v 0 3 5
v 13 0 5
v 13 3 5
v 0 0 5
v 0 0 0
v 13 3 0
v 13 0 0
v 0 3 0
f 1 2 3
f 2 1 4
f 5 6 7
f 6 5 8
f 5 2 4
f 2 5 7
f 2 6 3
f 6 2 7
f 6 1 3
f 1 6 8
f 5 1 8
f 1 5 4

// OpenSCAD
// Generated by SolidPython 1.0.1 on 2020-07-29 00:46:55


cube(size = [13, 3, 5]);
/***********************************************
*********      SolidPython code:      **********
************************************************
 
# import packages: SolidPython
from solid import *
from solid.utils import *
from itertools import chain, combinations, permutations


class Resize:

    def __init__(self, scad_file):
        self.scad_file = scad_file
        #self.scad_file = import_scad(scad_file)
        # cone/cylinder param:
        self.r1 = 0
        self.r2 = 0
        self.h = 0
        # rectangular prism param:
        self.w = 0
        self.l = 0
        # ellipse param:
        self.r = 0

    # import OpenScad code (file name corresponds to shape)


    # classify shape + parameters
    def assign(self, param1, param2, param3):
        if self.scad_file == 'cone.scad':
            self.r1 = param1
            self.r2 = param2
            self.h = param3
        elif self.scad_file == 'cylinder.scad':
            self.r1 = param1
            self.r2 = param2
            self.h = param3
        elif self.scad_file == 'rectangularPrism.scad':
            self.h = param1
            self.l = param2
            self.w = param3
        else:
            self.r = param1
            self.h = param2

    # resize parameters
    def iterate(self):
        x = range(3, 20, 2)
        i = 1
        if self.scad_file == 'cone.scad':
            tempList = list(permutations(x, 2))
            for temp in tempList:
                param1 = temp[0]
                param2 = temp[1]
                filepath = 'produced_scad_files/' + 'cone' + str(param1) + '_' + str(param2) + '_' + '.scad'
                scad_render_to_file(cylinder(h=param1, r1=param2, r2=0), filepath)

        elif self.scad_file == 'cylinder.scad':
            tempList = list(permutations(x, 3))
            for temp in tempList:
                param1 = temp[0]
                param2 = temp[1]
                filepath = 'produced_scad_files/' + 'cylinder' + str(param1) + '_' + str(param2) + '_' + '.scad'
                scad_render_to_file(cylinder(h=param1, r1=param2, r2=param2), filepath)

        elif self.scad_file == 'rectangularPrism.scad':
            tempList = list(permutations(x, 3))
            for temp in tempList:
                param1 = temp[0]
                param2 = temp[1]
                param3 = temp[2]
                filepath = 'produced_scad_files/' + 'rectangularPrism' + str(param1) + '_' + str(param2) + '_' + str(
                    param3) + '.scad'
                scad_render_to_file(cube(size=(param1, param2, param3)), filepath)

        elif self.scad_file == 'ellipse.scad':
            tempList = list(permutations(x, 4))
            for temp in tempList:
                param1 = temp[0]
                param2 = temp[1]
                param3 = temp[2]
                param4 = temp[3]
                filepath = 'produced_scad_files/' + 'ellipse' + str(param1) + '_' + str(param2) + '_' + str(param3) + '_' + str(param4) + '.scad'
                scad_render_to_file(scale([param1, param2, param3])(sphere(r=param4)), filepath)

    def render_to_scadfile(self):
        scad_render_to_file(scad, 'example.scad') 
 
************************************************/
